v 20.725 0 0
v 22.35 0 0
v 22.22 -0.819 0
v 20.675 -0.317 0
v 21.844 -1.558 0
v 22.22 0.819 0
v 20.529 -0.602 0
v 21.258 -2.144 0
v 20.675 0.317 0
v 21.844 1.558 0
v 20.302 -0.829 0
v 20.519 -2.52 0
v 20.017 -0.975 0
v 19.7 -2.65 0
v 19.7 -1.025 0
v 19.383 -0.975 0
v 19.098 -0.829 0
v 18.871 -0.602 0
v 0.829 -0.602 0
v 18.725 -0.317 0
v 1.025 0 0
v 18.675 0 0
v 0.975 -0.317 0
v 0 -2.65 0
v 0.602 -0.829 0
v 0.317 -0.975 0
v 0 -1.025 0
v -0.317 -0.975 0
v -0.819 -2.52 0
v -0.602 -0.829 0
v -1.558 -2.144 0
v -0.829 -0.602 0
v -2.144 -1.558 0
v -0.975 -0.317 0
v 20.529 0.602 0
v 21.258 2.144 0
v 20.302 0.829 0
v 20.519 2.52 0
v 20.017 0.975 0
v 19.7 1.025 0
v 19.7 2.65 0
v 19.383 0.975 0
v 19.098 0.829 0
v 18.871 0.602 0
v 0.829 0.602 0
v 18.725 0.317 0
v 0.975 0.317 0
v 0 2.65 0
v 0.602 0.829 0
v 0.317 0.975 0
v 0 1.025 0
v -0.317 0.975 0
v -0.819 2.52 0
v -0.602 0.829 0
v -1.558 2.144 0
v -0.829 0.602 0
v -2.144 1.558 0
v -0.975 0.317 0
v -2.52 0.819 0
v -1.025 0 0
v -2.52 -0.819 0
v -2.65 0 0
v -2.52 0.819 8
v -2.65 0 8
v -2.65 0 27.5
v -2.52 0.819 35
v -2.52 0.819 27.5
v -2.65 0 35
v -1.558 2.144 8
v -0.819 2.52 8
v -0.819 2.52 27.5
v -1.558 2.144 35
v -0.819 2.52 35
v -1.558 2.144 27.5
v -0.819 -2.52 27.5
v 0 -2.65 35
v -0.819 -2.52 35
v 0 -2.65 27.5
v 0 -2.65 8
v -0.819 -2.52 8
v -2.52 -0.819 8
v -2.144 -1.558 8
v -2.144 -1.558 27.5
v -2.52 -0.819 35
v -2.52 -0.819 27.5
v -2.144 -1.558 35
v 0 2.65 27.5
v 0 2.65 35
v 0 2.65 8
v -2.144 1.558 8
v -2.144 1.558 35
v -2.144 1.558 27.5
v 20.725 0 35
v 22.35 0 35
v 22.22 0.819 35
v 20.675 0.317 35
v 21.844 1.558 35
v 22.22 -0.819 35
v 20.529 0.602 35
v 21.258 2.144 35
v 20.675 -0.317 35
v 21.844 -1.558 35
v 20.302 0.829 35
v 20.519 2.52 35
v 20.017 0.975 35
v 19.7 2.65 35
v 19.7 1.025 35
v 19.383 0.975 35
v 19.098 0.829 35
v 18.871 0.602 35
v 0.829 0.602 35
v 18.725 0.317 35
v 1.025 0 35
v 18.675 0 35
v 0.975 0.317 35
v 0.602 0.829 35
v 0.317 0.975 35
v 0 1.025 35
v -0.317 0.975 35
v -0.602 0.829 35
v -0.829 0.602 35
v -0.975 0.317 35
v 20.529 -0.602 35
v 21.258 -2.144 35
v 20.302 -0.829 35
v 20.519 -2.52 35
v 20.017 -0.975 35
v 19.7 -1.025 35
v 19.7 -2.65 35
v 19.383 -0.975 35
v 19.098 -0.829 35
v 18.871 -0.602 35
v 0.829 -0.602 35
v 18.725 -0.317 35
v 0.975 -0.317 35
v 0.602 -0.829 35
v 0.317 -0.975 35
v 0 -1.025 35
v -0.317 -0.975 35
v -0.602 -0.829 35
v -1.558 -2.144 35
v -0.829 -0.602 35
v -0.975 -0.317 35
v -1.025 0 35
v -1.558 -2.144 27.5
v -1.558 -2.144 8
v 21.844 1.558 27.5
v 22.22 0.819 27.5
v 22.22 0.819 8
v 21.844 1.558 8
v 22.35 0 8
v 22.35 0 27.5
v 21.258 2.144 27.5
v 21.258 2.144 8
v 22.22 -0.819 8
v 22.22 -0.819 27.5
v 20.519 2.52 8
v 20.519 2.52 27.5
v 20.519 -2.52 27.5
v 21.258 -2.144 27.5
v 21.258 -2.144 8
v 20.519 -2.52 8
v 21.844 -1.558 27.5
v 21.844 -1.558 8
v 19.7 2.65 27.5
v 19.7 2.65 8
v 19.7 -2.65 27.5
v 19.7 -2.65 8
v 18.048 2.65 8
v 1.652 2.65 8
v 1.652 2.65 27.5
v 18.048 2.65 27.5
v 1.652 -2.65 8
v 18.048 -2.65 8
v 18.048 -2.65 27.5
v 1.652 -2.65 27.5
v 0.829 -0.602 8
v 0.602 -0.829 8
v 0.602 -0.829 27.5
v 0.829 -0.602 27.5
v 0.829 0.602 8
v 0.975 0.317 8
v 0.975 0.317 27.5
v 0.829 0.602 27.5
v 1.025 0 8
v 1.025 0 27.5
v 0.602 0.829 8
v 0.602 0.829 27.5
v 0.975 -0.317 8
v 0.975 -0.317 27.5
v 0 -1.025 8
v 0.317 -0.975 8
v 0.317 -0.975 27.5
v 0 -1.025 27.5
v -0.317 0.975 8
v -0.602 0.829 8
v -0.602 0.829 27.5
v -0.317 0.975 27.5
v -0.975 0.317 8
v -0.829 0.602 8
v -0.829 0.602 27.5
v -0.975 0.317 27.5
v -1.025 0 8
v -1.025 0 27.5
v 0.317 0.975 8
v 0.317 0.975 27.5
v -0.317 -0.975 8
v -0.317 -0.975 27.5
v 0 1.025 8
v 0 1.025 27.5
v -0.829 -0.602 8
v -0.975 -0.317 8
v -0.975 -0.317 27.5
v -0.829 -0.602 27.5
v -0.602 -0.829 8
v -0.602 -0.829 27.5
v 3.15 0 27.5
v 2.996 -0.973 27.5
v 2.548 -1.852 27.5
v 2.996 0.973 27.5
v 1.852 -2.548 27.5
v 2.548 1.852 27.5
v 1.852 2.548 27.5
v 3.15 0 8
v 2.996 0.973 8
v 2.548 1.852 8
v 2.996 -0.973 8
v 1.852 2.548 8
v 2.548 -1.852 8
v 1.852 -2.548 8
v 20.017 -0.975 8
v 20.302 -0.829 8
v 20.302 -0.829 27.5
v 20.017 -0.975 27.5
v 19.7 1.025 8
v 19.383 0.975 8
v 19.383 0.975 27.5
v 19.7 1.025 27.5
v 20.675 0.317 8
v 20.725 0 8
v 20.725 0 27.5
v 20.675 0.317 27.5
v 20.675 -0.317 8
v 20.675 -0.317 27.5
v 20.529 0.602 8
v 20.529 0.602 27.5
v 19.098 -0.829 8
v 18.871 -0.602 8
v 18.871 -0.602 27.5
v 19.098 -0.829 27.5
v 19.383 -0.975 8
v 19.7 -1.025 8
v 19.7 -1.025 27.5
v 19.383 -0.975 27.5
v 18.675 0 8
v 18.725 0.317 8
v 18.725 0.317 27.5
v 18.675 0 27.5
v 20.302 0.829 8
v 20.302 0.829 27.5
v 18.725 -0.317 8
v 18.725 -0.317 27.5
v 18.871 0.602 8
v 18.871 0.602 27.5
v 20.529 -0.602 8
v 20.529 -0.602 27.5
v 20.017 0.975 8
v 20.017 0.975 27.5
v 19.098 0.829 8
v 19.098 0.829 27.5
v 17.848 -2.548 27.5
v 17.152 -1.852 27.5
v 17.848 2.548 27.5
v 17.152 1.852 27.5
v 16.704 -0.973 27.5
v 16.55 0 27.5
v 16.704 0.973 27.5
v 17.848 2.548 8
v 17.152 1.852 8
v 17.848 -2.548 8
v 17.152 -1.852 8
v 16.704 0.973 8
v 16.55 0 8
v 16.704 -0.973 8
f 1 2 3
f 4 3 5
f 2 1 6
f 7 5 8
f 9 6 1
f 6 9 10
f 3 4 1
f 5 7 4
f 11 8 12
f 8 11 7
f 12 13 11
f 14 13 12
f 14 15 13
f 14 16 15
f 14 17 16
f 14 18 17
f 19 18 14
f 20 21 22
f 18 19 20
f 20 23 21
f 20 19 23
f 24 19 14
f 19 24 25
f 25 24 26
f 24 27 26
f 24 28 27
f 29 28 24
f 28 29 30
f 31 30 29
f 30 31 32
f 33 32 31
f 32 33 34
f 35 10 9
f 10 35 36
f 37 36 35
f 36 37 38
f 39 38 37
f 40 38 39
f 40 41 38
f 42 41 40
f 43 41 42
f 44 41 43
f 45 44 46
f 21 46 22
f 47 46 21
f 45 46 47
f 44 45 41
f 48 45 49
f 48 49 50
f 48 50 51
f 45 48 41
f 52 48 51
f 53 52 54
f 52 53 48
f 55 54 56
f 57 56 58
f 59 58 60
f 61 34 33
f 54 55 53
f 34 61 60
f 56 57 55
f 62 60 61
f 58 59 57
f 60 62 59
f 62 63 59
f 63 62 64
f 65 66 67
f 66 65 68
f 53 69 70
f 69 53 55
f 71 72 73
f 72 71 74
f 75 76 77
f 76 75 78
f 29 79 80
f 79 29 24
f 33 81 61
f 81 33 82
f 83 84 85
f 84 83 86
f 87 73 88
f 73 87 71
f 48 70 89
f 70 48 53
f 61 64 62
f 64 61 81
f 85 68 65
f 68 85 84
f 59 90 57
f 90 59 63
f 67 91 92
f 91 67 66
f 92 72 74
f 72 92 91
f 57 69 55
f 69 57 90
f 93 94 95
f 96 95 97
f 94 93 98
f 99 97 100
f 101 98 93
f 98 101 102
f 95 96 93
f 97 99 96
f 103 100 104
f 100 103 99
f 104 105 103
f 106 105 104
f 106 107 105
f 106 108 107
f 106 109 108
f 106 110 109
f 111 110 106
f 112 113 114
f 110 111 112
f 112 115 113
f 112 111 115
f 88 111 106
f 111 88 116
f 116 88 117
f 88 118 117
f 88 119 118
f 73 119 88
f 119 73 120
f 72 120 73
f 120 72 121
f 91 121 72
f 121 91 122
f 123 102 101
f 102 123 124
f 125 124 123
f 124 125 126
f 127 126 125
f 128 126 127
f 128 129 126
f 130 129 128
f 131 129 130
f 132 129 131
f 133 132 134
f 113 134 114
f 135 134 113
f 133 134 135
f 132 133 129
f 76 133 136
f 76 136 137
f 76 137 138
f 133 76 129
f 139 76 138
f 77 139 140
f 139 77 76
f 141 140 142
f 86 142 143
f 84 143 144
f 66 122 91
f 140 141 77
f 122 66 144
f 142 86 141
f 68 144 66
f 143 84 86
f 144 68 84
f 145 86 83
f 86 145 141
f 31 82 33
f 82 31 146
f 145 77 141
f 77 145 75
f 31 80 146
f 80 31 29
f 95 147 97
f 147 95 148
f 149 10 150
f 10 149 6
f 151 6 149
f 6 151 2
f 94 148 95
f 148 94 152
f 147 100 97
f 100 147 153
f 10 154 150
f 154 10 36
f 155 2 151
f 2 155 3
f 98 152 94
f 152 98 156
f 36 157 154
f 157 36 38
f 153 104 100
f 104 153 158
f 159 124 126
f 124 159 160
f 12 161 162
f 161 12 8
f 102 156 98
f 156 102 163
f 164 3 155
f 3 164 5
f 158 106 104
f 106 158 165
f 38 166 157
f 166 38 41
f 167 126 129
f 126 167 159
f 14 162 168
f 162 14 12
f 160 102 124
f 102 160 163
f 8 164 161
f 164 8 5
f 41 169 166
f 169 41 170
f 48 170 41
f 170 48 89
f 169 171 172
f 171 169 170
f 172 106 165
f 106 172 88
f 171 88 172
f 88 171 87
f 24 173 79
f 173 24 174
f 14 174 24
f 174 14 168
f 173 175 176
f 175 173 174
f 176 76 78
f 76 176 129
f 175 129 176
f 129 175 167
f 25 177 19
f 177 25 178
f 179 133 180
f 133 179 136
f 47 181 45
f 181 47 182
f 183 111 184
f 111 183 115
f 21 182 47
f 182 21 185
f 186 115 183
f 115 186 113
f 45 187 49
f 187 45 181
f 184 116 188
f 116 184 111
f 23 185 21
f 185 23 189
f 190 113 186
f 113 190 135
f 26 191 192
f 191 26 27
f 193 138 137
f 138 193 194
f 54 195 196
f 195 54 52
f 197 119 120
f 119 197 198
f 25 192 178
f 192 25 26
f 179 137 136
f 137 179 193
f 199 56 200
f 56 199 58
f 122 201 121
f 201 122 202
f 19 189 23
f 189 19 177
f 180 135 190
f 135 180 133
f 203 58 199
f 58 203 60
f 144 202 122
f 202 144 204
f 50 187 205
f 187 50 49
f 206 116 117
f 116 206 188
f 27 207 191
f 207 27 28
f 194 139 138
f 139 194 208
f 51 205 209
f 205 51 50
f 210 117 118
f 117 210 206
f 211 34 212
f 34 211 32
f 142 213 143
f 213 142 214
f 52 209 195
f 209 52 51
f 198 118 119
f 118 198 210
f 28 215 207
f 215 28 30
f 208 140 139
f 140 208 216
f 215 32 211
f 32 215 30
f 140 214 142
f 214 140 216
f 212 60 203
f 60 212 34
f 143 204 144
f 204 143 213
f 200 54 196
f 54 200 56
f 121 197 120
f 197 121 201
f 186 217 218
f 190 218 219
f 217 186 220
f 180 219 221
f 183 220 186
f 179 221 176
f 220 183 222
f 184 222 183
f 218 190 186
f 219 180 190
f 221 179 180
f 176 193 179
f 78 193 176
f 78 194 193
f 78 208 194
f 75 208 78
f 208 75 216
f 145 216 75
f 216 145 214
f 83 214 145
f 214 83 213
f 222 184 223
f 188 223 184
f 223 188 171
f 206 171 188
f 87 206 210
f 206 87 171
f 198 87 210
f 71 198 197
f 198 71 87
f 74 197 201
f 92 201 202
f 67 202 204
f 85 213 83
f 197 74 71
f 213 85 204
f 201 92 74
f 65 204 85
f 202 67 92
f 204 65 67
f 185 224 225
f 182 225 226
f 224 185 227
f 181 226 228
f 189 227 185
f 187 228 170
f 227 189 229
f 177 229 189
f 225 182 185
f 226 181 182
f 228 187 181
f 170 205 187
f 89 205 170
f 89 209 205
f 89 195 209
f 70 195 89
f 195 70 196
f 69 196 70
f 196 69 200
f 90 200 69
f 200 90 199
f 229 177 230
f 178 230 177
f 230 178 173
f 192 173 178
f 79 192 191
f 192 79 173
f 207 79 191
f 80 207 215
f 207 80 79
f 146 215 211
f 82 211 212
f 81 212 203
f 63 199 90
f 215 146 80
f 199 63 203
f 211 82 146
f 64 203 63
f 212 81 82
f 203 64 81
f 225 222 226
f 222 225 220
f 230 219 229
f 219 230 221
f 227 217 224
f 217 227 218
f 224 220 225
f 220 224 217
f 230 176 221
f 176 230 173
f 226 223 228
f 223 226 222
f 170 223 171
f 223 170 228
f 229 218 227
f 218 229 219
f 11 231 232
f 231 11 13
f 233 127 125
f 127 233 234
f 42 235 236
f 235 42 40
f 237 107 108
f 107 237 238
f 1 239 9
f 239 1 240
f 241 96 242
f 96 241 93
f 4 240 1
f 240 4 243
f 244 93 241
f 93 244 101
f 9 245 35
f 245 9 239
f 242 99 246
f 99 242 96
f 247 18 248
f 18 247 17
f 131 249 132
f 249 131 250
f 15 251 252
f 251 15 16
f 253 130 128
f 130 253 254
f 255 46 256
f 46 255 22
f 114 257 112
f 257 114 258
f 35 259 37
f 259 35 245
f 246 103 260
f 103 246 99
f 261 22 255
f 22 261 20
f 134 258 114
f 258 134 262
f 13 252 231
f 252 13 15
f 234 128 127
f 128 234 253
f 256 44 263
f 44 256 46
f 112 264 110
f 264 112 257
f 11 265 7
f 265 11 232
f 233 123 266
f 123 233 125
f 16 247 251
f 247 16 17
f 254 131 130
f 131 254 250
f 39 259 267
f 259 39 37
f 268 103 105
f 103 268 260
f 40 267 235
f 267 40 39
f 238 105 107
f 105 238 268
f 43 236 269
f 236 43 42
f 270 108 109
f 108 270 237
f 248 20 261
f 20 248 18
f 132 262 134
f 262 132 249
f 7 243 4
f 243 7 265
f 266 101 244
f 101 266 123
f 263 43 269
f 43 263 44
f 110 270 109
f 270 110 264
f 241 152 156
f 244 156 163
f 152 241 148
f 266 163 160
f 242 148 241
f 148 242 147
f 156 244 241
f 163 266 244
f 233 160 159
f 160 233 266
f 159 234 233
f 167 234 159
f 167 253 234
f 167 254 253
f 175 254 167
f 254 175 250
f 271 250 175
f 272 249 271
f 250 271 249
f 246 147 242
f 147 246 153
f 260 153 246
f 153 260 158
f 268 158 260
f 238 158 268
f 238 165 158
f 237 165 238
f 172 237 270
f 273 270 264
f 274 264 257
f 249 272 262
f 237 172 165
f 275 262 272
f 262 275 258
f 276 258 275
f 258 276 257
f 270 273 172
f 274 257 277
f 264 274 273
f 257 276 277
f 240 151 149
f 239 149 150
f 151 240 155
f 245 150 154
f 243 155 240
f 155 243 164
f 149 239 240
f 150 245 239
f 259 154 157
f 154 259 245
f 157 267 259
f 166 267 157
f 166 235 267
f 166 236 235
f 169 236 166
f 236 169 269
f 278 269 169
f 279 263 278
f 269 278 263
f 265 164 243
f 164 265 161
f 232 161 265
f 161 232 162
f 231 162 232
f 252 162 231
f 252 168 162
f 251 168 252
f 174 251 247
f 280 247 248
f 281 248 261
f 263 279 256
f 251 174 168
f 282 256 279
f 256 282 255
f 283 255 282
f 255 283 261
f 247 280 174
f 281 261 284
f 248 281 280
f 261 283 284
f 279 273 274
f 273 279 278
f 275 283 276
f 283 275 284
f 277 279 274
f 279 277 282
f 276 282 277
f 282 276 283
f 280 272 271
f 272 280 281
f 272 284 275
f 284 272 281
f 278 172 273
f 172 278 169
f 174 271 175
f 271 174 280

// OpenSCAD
// file: end.scad
include <belt_configuration.scad>

module end()
{
  difference()
  {
    union()
    {
      cylinder(r=belt_thickness / 2, h=belt_height);

      translate([h_width - belt_thickness,0,0])
        cylinder(r=belt_thickness / 2, h=belt_height);

      translate([0, -belt_thickness / 2, 0])
        cube([h_width-belt_thickness, belt_thickness, belt_height]);
    }

    translate([0,0,-mo])
      cylinder(r=pin_diameter / 2, h=belt_height + 2 * mo);
  
    translate([-belt_thickness / 2, -belt_thickness / 2 - mo, belt_height/2 - link_depth_height/2+link_tolerance / 2])
      cube([link_depth-pin_diameter/4, belt_thickness + 2* mo, link_depth_height-link_tolerance/2]);

    translate([0,0, belt_height/2 - link_depth_height/2+link_tolerance / 2])
      cylinder(r=(belt_thickness+link_tolerance) / 2, h=link_depth_height-link_tolerance/2);
  }
}

end();
// file: belt_configuration.scad
belt_thickness = 5.3;
belt_height = 35;
buckle_thickness = 2;
buckle_length = 30;

$fn = 20;

cross_width = 25;
h_width = 25;
peak_width = 10;

link_height = 20;

pin_diameter = 2.05;

pin_tolerance = 0.2;

hole_diameter = 3;

mo = 0.01;


link_tolerance = 1;
link_depth = pin_diameter + 2*link_tolerance;
link_depth_height = 20;

tolerance = 1;
// main file
include <belt_configuration.scad>

use <end.scad>

module h()
{
  difference()
  {
    end();

    translate([h_width - belt_thickness,0,-mo])
      cylinder(r=pin_diameter / 2, h=belt_height + 2 * mo);

    translate([h_width - link_depth +pin_diameter/4- belt_thickness / 2,-belt_thickness / 2 - mo, belt_height/2 - link_depth_height/2+link_tolerance / 2])
      cube([link_depth-pin_diameter/4, belt_thickness + 2* mo, link_depth_height-link_tolerance/2]); 

    translate([h_width - belt_thickness,0, belt_height/2 - link_depth_height/2+link_tolerance / 2])
      cylinder(r=(belt_thickness+link_tolerance) / 2, h=link_depth_height-link_tolerance/2);
  }
}

h();
